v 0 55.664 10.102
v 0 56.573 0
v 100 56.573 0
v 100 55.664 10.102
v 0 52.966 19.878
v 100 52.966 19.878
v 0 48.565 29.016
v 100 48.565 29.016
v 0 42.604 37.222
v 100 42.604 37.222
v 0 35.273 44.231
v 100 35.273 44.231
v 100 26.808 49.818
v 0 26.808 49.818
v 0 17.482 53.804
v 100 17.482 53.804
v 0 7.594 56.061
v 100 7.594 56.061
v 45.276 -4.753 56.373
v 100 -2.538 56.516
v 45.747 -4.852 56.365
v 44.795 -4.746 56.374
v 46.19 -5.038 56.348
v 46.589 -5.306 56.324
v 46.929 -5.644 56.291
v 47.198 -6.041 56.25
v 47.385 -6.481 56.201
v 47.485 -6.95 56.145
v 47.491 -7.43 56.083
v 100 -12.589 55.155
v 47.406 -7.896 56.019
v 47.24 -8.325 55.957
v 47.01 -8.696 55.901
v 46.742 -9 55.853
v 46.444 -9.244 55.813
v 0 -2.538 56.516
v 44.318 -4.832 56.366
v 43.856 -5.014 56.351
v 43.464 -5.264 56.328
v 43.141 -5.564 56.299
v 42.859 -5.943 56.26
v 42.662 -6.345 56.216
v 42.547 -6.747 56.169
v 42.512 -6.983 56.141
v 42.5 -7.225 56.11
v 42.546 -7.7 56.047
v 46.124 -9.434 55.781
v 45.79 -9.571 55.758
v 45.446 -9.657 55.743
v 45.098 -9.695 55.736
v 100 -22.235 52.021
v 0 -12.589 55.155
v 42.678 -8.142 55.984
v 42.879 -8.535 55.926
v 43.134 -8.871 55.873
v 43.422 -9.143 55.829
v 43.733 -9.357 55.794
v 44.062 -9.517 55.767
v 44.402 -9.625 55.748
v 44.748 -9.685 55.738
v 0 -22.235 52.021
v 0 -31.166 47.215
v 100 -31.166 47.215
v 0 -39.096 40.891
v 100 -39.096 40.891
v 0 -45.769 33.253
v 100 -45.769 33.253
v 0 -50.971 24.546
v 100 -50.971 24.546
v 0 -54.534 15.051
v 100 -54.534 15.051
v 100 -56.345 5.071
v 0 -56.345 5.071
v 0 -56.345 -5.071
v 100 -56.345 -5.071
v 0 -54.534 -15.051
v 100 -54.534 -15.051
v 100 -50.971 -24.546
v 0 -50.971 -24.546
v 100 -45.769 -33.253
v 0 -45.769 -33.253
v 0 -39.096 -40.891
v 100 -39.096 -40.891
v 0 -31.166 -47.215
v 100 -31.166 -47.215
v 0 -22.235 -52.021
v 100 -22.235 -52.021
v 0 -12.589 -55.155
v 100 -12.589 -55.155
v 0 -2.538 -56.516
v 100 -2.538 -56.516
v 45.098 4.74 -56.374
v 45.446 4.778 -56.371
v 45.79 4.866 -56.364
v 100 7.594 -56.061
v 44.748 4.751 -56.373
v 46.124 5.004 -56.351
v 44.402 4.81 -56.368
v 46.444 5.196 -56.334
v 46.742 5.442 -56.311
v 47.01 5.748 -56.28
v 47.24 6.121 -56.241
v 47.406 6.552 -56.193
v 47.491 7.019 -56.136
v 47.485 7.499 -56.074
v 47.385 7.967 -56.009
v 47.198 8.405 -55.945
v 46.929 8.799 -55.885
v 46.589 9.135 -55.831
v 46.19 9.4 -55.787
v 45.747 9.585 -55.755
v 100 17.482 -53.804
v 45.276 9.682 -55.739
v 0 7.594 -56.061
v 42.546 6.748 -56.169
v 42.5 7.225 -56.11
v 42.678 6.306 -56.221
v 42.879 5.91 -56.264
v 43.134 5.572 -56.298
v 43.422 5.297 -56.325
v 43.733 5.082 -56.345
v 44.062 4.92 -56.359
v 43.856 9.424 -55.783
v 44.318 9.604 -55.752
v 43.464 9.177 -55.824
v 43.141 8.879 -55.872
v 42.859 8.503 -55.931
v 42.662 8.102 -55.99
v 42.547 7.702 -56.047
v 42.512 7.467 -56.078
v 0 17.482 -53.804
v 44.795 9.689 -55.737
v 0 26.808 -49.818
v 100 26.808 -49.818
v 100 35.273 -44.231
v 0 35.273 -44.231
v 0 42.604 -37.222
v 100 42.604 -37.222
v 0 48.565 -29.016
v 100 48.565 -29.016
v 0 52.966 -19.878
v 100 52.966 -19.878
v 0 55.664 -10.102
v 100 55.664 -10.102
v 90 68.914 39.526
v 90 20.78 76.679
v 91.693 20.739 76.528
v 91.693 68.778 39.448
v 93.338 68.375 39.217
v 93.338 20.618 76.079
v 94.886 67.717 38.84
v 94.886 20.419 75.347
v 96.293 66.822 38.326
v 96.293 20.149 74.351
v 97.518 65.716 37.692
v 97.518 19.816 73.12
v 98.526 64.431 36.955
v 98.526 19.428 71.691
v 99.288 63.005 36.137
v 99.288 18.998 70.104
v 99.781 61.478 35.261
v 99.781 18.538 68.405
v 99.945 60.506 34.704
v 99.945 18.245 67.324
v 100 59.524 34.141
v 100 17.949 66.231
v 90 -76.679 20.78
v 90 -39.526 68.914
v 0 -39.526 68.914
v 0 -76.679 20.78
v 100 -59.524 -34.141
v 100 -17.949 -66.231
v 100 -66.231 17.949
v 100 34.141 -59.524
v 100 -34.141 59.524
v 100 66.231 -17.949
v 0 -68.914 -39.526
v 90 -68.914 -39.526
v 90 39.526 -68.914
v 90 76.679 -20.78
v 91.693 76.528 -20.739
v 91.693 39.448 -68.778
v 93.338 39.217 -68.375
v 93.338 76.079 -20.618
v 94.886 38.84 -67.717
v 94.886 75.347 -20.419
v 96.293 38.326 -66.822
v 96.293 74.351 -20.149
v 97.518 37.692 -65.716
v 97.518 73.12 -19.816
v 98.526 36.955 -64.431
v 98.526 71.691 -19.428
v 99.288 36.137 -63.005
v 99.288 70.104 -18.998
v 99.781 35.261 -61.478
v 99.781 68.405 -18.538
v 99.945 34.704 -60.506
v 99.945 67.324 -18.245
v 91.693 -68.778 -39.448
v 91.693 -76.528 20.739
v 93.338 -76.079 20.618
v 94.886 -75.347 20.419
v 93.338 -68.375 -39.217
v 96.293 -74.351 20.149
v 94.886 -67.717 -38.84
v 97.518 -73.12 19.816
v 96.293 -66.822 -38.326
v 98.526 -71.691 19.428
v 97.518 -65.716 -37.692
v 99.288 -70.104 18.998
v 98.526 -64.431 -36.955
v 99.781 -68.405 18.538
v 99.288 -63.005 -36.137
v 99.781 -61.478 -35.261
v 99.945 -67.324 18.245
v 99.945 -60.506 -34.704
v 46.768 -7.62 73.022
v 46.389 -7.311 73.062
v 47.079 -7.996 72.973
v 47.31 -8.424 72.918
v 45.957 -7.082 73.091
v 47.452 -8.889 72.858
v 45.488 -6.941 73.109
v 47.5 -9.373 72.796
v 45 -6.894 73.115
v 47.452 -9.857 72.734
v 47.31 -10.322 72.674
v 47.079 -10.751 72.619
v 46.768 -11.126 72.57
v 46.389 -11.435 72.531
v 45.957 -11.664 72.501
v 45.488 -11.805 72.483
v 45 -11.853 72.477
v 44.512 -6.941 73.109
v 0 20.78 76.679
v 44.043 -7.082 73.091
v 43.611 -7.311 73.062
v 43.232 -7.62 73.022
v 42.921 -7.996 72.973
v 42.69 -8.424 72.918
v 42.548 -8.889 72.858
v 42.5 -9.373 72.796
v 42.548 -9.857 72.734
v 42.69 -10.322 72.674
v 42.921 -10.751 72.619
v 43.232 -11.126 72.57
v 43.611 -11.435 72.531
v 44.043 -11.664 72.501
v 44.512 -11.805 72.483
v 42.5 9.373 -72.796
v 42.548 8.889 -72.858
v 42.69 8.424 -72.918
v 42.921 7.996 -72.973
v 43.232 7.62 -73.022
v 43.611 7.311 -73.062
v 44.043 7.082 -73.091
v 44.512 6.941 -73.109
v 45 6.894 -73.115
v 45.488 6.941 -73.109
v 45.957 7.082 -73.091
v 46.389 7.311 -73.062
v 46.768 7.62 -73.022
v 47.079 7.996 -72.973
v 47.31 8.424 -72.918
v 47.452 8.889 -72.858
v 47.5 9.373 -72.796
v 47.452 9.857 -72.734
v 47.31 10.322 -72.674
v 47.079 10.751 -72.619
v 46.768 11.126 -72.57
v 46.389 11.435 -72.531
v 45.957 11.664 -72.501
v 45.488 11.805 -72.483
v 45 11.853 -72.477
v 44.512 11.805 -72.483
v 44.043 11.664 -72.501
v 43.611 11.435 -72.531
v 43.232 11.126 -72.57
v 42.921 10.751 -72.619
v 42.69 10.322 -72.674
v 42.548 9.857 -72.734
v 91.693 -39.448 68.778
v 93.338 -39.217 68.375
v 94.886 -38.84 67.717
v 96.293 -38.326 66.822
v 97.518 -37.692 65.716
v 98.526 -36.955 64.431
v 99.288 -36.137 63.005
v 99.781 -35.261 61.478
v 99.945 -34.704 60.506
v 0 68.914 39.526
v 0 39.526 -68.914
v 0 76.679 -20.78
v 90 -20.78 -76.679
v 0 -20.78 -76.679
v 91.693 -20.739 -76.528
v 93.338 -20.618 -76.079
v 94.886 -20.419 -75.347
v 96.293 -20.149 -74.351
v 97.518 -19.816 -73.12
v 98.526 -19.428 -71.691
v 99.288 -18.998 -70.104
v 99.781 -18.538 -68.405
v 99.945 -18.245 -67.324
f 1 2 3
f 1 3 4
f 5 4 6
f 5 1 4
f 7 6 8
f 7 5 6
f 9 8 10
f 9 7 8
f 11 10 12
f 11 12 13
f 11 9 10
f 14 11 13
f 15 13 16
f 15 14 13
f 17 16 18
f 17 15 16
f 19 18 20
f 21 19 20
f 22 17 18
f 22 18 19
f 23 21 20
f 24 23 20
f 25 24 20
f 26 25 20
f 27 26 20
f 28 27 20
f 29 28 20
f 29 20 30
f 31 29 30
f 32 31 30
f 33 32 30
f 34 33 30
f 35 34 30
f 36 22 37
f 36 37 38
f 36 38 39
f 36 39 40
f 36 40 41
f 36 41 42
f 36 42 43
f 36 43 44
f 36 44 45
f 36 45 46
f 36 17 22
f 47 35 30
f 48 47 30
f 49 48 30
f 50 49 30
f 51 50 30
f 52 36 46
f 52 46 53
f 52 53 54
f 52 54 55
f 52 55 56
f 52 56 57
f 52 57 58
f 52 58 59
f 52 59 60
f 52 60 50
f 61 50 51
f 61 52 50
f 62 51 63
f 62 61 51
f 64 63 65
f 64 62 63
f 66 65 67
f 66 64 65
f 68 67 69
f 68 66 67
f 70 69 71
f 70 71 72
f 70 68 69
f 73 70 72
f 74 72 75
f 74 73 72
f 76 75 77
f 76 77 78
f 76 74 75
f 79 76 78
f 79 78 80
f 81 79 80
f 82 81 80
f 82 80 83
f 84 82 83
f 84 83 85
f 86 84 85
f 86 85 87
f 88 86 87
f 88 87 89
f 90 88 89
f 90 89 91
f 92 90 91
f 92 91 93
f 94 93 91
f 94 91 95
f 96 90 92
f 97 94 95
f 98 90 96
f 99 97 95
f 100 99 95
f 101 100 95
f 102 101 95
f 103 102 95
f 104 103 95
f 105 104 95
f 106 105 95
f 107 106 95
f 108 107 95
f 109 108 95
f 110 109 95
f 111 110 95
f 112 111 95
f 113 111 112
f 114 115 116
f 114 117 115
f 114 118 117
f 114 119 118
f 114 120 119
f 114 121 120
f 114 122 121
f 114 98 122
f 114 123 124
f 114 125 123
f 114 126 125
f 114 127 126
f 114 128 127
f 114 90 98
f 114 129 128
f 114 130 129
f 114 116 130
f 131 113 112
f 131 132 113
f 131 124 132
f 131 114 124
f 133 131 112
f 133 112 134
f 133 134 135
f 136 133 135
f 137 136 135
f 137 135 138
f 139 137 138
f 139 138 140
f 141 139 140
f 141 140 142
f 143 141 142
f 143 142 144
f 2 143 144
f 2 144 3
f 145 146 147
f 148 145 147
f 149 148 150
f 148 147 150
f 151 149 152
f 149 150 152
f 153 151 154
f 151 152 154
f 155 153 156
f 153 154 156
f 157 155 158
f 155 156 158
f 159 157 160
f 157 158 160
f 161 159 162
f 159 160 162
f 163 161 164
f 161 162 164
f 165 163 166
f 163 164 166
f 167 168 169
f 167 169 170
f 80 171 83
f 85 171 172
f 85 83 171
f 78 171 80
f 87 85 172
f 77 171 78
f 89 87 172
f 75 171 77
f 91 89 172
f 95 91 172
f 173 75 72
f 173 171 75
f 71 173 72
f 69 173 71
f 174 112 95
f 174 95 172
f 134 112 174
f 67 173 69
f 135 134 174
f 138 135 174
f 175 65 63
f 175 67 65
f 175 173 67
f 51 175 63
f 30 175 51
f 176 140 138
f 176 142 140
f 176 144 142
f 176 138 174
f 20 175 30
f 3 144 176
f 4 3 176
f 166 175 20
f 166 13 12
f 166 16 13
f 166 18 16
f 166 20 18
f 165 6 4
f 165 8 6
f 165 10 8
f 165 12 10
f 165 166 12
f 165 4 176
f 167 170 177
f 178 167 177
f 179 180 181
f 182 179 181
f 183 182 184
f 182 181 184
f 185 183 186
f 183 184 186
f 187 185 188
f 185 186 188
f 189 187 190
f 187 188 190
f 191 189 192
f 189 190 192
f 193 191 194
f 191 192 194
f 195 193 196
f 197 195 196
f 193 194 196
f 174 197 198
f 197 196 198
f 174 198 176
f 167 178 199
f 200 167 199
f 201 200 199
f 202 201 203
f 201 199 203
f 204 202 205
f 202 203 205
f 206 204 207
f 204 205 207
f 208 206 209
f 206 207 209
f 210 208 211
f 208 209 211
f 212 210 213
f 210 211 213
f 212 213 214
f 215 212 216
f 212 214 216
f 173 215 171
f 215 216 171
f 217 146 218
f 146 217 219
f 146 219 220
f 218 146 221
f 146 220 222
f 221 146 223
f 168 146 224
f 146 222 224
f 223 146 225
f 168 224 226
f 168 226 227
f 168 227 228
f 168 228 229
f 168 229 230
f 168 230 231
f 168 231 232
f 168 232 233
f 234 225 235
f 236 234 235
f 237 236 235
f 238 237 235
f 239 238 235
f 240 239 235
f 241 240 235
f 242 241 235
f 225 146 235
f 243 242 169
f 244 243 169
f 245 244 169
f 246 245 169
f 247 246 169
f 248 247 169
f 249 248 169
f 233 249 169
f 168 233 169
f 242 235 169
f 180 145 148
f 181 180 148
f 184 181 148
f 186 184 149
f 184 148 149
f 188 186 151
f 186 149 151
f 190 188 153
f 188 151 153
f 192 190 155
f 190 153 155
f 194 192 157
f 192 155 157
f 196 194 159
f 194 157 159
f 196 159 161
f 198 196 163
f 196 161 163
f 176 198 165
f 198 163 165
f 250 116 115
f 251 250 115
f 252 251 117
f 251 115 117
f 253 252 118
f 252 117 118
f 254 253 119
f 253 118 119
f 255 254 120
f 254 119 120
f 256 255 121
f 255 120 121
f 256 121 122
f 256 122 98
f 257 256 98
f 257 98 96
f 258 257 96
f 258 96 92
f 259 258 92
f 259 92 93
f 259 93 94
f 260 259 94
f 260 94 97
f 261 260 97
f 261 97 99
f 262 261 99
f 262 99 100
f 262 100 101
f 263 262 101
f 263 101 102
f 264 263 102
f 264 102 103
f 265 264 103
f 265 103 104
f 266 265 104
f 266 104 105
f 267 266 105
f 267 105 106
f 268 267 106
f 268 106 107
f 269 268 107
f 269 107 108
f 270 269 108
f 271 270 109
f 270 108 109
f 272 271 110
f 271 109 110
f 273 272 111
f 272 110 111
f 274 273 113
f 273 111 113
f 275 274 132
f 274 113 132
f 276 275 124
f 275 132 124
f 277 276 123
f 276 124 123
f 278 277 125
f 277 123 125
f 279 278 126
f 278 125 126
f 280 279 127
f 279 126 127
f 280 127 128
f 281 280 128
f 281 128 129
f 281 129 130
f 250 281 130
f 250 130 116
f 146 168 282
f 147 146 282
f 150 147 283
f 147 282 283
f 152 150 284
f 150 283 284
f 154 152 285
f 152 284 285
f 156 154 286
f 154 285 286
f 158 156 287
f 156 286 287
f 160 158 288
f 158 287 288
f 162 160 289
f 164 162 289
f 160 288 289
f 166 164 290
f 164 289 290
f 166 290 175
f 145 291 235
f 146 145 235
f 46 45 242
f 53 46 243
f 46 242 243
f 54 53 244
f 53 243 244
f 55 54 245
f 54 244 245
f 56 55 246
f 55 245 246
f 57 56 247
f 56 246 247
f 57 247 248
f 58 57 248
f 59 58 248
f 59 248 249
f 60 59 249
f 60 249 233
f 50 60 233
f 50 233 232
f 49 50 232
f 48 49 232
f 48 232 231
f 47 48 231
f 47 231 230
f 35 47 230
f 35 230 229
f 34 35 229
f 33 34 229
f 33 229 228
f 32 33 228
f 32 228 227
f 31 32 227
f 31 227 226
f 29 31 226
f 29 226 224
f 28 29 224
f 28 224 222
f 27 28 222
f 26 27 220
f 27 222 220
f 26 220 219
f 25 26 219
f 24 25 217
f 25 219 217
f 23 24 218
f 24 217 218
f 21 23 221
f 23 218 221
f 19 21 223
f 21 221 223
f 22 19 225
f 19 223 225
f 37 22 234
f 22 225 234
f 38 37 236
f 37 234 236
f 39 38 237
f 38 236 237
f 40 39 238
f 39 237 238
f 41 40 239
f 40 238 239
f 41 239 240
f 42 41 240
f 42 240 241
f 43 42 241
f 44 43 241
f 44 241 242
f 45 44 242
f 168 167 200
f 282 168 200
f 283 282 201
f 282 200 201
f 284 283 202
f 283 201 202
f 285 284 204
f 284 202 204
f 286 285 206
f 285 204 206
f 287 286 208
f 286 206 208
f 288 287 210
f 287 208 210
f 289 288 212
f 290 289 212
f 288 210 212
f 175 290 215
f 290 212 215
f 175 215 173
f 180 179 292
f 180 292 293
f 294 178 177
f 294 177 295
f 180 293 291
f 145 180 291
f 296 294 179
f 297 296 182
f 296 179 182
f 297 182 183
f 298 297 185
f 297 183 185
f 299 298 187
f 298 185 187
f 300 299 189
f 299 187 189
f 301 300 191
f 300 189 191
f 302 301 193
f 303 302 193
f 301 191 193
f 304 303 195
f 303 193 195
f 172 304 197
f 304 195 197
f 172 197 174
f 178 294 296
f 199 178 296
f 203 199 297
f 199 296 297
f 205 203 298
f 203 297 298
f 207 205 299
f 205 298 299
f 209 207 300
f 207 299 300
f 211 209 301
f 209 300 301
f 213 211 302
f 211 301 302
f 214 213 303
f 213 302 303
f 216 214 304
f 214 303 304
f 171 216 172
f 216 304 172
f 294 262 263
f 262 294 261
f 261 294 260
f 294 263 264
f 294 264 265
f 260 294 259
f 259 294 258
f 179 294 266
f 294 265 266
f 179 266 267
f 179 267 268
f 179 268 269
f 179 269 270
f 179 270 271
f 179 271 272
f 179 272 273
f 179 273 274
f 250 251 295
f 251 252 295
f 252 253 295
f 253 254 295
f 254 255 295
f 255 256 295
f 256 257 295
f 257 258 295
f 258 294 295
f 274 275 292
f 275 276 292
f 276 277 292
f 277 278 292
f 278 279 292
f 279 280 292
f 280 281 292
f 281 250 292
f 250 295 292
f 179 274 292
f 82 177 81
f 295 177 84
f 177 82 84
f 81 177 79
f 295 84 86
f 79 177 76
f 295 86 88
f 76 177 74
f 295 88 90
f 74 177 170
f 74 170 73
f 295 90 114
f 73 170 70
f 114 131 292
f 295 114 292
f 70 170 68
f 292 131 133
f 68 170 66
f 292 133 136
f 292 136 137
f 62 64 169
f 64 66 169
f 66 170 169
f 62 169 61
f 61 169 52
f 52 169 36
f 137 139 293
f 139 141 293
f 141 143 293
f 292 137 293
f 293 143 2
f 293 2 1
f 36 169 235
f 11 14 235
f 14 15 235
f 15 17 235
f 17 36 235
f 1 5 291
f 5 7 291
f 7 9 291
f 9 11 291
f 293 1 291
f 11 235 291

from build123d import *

# Parameters (mm, degrees)
F0_R     = 56.5732299852
F1_DEPTH = 100
F2_R     = 10
F4_D     = 5


with BuildPart() as f1:
    # F0 (on Right) → F1 (new body)
    with BuildSketch(Plane.YZ):
        Polygon((39.5261961416, -68.9136280333), (76.6785350248, -20.7800523723), (68.9136280333, 39.5261961416), (20.7800523723, 76.6785350248), (-39.5261961416, 68.9136280333), (-76.6785350248, 20.7800523723), (-68.9136280333, -39.5261961416), (-20.7800523723, -76.6785350248), align=None)
        Circle(F0_R, mode=Mode.SUBTRACT)
    extrude(amount=F1_DEPTH)

    # F2
    f2_edges = [f1.edges().sort_by_distance(p)[0] for p in [
        (100, -9.373072, 72.796082),
        (100, -58.102366, 44.84684),
        (100, -72.796082, -9.373072),
        (100, -44.84684, -58.102366),
        (100, 9.373072, -72.796082),
        (100, 58.102366, -44.84684),
        (100, 72.796082, 9.373072),
        (100, 44.84684, 58.102366),
    ]]
    fillet(f2_edges, radius=F2_R)

    # F4 (through all)
    with Locations(Plane(origin=(0, 9.3730718847, -72.796081529), x_dir=(1, 0, 0), z_dir=(0, 0.1277036949, -0.9918123645))):
        with Locations((45, 0)):
            Hole(F4_D / 2)


solid = f1.part
